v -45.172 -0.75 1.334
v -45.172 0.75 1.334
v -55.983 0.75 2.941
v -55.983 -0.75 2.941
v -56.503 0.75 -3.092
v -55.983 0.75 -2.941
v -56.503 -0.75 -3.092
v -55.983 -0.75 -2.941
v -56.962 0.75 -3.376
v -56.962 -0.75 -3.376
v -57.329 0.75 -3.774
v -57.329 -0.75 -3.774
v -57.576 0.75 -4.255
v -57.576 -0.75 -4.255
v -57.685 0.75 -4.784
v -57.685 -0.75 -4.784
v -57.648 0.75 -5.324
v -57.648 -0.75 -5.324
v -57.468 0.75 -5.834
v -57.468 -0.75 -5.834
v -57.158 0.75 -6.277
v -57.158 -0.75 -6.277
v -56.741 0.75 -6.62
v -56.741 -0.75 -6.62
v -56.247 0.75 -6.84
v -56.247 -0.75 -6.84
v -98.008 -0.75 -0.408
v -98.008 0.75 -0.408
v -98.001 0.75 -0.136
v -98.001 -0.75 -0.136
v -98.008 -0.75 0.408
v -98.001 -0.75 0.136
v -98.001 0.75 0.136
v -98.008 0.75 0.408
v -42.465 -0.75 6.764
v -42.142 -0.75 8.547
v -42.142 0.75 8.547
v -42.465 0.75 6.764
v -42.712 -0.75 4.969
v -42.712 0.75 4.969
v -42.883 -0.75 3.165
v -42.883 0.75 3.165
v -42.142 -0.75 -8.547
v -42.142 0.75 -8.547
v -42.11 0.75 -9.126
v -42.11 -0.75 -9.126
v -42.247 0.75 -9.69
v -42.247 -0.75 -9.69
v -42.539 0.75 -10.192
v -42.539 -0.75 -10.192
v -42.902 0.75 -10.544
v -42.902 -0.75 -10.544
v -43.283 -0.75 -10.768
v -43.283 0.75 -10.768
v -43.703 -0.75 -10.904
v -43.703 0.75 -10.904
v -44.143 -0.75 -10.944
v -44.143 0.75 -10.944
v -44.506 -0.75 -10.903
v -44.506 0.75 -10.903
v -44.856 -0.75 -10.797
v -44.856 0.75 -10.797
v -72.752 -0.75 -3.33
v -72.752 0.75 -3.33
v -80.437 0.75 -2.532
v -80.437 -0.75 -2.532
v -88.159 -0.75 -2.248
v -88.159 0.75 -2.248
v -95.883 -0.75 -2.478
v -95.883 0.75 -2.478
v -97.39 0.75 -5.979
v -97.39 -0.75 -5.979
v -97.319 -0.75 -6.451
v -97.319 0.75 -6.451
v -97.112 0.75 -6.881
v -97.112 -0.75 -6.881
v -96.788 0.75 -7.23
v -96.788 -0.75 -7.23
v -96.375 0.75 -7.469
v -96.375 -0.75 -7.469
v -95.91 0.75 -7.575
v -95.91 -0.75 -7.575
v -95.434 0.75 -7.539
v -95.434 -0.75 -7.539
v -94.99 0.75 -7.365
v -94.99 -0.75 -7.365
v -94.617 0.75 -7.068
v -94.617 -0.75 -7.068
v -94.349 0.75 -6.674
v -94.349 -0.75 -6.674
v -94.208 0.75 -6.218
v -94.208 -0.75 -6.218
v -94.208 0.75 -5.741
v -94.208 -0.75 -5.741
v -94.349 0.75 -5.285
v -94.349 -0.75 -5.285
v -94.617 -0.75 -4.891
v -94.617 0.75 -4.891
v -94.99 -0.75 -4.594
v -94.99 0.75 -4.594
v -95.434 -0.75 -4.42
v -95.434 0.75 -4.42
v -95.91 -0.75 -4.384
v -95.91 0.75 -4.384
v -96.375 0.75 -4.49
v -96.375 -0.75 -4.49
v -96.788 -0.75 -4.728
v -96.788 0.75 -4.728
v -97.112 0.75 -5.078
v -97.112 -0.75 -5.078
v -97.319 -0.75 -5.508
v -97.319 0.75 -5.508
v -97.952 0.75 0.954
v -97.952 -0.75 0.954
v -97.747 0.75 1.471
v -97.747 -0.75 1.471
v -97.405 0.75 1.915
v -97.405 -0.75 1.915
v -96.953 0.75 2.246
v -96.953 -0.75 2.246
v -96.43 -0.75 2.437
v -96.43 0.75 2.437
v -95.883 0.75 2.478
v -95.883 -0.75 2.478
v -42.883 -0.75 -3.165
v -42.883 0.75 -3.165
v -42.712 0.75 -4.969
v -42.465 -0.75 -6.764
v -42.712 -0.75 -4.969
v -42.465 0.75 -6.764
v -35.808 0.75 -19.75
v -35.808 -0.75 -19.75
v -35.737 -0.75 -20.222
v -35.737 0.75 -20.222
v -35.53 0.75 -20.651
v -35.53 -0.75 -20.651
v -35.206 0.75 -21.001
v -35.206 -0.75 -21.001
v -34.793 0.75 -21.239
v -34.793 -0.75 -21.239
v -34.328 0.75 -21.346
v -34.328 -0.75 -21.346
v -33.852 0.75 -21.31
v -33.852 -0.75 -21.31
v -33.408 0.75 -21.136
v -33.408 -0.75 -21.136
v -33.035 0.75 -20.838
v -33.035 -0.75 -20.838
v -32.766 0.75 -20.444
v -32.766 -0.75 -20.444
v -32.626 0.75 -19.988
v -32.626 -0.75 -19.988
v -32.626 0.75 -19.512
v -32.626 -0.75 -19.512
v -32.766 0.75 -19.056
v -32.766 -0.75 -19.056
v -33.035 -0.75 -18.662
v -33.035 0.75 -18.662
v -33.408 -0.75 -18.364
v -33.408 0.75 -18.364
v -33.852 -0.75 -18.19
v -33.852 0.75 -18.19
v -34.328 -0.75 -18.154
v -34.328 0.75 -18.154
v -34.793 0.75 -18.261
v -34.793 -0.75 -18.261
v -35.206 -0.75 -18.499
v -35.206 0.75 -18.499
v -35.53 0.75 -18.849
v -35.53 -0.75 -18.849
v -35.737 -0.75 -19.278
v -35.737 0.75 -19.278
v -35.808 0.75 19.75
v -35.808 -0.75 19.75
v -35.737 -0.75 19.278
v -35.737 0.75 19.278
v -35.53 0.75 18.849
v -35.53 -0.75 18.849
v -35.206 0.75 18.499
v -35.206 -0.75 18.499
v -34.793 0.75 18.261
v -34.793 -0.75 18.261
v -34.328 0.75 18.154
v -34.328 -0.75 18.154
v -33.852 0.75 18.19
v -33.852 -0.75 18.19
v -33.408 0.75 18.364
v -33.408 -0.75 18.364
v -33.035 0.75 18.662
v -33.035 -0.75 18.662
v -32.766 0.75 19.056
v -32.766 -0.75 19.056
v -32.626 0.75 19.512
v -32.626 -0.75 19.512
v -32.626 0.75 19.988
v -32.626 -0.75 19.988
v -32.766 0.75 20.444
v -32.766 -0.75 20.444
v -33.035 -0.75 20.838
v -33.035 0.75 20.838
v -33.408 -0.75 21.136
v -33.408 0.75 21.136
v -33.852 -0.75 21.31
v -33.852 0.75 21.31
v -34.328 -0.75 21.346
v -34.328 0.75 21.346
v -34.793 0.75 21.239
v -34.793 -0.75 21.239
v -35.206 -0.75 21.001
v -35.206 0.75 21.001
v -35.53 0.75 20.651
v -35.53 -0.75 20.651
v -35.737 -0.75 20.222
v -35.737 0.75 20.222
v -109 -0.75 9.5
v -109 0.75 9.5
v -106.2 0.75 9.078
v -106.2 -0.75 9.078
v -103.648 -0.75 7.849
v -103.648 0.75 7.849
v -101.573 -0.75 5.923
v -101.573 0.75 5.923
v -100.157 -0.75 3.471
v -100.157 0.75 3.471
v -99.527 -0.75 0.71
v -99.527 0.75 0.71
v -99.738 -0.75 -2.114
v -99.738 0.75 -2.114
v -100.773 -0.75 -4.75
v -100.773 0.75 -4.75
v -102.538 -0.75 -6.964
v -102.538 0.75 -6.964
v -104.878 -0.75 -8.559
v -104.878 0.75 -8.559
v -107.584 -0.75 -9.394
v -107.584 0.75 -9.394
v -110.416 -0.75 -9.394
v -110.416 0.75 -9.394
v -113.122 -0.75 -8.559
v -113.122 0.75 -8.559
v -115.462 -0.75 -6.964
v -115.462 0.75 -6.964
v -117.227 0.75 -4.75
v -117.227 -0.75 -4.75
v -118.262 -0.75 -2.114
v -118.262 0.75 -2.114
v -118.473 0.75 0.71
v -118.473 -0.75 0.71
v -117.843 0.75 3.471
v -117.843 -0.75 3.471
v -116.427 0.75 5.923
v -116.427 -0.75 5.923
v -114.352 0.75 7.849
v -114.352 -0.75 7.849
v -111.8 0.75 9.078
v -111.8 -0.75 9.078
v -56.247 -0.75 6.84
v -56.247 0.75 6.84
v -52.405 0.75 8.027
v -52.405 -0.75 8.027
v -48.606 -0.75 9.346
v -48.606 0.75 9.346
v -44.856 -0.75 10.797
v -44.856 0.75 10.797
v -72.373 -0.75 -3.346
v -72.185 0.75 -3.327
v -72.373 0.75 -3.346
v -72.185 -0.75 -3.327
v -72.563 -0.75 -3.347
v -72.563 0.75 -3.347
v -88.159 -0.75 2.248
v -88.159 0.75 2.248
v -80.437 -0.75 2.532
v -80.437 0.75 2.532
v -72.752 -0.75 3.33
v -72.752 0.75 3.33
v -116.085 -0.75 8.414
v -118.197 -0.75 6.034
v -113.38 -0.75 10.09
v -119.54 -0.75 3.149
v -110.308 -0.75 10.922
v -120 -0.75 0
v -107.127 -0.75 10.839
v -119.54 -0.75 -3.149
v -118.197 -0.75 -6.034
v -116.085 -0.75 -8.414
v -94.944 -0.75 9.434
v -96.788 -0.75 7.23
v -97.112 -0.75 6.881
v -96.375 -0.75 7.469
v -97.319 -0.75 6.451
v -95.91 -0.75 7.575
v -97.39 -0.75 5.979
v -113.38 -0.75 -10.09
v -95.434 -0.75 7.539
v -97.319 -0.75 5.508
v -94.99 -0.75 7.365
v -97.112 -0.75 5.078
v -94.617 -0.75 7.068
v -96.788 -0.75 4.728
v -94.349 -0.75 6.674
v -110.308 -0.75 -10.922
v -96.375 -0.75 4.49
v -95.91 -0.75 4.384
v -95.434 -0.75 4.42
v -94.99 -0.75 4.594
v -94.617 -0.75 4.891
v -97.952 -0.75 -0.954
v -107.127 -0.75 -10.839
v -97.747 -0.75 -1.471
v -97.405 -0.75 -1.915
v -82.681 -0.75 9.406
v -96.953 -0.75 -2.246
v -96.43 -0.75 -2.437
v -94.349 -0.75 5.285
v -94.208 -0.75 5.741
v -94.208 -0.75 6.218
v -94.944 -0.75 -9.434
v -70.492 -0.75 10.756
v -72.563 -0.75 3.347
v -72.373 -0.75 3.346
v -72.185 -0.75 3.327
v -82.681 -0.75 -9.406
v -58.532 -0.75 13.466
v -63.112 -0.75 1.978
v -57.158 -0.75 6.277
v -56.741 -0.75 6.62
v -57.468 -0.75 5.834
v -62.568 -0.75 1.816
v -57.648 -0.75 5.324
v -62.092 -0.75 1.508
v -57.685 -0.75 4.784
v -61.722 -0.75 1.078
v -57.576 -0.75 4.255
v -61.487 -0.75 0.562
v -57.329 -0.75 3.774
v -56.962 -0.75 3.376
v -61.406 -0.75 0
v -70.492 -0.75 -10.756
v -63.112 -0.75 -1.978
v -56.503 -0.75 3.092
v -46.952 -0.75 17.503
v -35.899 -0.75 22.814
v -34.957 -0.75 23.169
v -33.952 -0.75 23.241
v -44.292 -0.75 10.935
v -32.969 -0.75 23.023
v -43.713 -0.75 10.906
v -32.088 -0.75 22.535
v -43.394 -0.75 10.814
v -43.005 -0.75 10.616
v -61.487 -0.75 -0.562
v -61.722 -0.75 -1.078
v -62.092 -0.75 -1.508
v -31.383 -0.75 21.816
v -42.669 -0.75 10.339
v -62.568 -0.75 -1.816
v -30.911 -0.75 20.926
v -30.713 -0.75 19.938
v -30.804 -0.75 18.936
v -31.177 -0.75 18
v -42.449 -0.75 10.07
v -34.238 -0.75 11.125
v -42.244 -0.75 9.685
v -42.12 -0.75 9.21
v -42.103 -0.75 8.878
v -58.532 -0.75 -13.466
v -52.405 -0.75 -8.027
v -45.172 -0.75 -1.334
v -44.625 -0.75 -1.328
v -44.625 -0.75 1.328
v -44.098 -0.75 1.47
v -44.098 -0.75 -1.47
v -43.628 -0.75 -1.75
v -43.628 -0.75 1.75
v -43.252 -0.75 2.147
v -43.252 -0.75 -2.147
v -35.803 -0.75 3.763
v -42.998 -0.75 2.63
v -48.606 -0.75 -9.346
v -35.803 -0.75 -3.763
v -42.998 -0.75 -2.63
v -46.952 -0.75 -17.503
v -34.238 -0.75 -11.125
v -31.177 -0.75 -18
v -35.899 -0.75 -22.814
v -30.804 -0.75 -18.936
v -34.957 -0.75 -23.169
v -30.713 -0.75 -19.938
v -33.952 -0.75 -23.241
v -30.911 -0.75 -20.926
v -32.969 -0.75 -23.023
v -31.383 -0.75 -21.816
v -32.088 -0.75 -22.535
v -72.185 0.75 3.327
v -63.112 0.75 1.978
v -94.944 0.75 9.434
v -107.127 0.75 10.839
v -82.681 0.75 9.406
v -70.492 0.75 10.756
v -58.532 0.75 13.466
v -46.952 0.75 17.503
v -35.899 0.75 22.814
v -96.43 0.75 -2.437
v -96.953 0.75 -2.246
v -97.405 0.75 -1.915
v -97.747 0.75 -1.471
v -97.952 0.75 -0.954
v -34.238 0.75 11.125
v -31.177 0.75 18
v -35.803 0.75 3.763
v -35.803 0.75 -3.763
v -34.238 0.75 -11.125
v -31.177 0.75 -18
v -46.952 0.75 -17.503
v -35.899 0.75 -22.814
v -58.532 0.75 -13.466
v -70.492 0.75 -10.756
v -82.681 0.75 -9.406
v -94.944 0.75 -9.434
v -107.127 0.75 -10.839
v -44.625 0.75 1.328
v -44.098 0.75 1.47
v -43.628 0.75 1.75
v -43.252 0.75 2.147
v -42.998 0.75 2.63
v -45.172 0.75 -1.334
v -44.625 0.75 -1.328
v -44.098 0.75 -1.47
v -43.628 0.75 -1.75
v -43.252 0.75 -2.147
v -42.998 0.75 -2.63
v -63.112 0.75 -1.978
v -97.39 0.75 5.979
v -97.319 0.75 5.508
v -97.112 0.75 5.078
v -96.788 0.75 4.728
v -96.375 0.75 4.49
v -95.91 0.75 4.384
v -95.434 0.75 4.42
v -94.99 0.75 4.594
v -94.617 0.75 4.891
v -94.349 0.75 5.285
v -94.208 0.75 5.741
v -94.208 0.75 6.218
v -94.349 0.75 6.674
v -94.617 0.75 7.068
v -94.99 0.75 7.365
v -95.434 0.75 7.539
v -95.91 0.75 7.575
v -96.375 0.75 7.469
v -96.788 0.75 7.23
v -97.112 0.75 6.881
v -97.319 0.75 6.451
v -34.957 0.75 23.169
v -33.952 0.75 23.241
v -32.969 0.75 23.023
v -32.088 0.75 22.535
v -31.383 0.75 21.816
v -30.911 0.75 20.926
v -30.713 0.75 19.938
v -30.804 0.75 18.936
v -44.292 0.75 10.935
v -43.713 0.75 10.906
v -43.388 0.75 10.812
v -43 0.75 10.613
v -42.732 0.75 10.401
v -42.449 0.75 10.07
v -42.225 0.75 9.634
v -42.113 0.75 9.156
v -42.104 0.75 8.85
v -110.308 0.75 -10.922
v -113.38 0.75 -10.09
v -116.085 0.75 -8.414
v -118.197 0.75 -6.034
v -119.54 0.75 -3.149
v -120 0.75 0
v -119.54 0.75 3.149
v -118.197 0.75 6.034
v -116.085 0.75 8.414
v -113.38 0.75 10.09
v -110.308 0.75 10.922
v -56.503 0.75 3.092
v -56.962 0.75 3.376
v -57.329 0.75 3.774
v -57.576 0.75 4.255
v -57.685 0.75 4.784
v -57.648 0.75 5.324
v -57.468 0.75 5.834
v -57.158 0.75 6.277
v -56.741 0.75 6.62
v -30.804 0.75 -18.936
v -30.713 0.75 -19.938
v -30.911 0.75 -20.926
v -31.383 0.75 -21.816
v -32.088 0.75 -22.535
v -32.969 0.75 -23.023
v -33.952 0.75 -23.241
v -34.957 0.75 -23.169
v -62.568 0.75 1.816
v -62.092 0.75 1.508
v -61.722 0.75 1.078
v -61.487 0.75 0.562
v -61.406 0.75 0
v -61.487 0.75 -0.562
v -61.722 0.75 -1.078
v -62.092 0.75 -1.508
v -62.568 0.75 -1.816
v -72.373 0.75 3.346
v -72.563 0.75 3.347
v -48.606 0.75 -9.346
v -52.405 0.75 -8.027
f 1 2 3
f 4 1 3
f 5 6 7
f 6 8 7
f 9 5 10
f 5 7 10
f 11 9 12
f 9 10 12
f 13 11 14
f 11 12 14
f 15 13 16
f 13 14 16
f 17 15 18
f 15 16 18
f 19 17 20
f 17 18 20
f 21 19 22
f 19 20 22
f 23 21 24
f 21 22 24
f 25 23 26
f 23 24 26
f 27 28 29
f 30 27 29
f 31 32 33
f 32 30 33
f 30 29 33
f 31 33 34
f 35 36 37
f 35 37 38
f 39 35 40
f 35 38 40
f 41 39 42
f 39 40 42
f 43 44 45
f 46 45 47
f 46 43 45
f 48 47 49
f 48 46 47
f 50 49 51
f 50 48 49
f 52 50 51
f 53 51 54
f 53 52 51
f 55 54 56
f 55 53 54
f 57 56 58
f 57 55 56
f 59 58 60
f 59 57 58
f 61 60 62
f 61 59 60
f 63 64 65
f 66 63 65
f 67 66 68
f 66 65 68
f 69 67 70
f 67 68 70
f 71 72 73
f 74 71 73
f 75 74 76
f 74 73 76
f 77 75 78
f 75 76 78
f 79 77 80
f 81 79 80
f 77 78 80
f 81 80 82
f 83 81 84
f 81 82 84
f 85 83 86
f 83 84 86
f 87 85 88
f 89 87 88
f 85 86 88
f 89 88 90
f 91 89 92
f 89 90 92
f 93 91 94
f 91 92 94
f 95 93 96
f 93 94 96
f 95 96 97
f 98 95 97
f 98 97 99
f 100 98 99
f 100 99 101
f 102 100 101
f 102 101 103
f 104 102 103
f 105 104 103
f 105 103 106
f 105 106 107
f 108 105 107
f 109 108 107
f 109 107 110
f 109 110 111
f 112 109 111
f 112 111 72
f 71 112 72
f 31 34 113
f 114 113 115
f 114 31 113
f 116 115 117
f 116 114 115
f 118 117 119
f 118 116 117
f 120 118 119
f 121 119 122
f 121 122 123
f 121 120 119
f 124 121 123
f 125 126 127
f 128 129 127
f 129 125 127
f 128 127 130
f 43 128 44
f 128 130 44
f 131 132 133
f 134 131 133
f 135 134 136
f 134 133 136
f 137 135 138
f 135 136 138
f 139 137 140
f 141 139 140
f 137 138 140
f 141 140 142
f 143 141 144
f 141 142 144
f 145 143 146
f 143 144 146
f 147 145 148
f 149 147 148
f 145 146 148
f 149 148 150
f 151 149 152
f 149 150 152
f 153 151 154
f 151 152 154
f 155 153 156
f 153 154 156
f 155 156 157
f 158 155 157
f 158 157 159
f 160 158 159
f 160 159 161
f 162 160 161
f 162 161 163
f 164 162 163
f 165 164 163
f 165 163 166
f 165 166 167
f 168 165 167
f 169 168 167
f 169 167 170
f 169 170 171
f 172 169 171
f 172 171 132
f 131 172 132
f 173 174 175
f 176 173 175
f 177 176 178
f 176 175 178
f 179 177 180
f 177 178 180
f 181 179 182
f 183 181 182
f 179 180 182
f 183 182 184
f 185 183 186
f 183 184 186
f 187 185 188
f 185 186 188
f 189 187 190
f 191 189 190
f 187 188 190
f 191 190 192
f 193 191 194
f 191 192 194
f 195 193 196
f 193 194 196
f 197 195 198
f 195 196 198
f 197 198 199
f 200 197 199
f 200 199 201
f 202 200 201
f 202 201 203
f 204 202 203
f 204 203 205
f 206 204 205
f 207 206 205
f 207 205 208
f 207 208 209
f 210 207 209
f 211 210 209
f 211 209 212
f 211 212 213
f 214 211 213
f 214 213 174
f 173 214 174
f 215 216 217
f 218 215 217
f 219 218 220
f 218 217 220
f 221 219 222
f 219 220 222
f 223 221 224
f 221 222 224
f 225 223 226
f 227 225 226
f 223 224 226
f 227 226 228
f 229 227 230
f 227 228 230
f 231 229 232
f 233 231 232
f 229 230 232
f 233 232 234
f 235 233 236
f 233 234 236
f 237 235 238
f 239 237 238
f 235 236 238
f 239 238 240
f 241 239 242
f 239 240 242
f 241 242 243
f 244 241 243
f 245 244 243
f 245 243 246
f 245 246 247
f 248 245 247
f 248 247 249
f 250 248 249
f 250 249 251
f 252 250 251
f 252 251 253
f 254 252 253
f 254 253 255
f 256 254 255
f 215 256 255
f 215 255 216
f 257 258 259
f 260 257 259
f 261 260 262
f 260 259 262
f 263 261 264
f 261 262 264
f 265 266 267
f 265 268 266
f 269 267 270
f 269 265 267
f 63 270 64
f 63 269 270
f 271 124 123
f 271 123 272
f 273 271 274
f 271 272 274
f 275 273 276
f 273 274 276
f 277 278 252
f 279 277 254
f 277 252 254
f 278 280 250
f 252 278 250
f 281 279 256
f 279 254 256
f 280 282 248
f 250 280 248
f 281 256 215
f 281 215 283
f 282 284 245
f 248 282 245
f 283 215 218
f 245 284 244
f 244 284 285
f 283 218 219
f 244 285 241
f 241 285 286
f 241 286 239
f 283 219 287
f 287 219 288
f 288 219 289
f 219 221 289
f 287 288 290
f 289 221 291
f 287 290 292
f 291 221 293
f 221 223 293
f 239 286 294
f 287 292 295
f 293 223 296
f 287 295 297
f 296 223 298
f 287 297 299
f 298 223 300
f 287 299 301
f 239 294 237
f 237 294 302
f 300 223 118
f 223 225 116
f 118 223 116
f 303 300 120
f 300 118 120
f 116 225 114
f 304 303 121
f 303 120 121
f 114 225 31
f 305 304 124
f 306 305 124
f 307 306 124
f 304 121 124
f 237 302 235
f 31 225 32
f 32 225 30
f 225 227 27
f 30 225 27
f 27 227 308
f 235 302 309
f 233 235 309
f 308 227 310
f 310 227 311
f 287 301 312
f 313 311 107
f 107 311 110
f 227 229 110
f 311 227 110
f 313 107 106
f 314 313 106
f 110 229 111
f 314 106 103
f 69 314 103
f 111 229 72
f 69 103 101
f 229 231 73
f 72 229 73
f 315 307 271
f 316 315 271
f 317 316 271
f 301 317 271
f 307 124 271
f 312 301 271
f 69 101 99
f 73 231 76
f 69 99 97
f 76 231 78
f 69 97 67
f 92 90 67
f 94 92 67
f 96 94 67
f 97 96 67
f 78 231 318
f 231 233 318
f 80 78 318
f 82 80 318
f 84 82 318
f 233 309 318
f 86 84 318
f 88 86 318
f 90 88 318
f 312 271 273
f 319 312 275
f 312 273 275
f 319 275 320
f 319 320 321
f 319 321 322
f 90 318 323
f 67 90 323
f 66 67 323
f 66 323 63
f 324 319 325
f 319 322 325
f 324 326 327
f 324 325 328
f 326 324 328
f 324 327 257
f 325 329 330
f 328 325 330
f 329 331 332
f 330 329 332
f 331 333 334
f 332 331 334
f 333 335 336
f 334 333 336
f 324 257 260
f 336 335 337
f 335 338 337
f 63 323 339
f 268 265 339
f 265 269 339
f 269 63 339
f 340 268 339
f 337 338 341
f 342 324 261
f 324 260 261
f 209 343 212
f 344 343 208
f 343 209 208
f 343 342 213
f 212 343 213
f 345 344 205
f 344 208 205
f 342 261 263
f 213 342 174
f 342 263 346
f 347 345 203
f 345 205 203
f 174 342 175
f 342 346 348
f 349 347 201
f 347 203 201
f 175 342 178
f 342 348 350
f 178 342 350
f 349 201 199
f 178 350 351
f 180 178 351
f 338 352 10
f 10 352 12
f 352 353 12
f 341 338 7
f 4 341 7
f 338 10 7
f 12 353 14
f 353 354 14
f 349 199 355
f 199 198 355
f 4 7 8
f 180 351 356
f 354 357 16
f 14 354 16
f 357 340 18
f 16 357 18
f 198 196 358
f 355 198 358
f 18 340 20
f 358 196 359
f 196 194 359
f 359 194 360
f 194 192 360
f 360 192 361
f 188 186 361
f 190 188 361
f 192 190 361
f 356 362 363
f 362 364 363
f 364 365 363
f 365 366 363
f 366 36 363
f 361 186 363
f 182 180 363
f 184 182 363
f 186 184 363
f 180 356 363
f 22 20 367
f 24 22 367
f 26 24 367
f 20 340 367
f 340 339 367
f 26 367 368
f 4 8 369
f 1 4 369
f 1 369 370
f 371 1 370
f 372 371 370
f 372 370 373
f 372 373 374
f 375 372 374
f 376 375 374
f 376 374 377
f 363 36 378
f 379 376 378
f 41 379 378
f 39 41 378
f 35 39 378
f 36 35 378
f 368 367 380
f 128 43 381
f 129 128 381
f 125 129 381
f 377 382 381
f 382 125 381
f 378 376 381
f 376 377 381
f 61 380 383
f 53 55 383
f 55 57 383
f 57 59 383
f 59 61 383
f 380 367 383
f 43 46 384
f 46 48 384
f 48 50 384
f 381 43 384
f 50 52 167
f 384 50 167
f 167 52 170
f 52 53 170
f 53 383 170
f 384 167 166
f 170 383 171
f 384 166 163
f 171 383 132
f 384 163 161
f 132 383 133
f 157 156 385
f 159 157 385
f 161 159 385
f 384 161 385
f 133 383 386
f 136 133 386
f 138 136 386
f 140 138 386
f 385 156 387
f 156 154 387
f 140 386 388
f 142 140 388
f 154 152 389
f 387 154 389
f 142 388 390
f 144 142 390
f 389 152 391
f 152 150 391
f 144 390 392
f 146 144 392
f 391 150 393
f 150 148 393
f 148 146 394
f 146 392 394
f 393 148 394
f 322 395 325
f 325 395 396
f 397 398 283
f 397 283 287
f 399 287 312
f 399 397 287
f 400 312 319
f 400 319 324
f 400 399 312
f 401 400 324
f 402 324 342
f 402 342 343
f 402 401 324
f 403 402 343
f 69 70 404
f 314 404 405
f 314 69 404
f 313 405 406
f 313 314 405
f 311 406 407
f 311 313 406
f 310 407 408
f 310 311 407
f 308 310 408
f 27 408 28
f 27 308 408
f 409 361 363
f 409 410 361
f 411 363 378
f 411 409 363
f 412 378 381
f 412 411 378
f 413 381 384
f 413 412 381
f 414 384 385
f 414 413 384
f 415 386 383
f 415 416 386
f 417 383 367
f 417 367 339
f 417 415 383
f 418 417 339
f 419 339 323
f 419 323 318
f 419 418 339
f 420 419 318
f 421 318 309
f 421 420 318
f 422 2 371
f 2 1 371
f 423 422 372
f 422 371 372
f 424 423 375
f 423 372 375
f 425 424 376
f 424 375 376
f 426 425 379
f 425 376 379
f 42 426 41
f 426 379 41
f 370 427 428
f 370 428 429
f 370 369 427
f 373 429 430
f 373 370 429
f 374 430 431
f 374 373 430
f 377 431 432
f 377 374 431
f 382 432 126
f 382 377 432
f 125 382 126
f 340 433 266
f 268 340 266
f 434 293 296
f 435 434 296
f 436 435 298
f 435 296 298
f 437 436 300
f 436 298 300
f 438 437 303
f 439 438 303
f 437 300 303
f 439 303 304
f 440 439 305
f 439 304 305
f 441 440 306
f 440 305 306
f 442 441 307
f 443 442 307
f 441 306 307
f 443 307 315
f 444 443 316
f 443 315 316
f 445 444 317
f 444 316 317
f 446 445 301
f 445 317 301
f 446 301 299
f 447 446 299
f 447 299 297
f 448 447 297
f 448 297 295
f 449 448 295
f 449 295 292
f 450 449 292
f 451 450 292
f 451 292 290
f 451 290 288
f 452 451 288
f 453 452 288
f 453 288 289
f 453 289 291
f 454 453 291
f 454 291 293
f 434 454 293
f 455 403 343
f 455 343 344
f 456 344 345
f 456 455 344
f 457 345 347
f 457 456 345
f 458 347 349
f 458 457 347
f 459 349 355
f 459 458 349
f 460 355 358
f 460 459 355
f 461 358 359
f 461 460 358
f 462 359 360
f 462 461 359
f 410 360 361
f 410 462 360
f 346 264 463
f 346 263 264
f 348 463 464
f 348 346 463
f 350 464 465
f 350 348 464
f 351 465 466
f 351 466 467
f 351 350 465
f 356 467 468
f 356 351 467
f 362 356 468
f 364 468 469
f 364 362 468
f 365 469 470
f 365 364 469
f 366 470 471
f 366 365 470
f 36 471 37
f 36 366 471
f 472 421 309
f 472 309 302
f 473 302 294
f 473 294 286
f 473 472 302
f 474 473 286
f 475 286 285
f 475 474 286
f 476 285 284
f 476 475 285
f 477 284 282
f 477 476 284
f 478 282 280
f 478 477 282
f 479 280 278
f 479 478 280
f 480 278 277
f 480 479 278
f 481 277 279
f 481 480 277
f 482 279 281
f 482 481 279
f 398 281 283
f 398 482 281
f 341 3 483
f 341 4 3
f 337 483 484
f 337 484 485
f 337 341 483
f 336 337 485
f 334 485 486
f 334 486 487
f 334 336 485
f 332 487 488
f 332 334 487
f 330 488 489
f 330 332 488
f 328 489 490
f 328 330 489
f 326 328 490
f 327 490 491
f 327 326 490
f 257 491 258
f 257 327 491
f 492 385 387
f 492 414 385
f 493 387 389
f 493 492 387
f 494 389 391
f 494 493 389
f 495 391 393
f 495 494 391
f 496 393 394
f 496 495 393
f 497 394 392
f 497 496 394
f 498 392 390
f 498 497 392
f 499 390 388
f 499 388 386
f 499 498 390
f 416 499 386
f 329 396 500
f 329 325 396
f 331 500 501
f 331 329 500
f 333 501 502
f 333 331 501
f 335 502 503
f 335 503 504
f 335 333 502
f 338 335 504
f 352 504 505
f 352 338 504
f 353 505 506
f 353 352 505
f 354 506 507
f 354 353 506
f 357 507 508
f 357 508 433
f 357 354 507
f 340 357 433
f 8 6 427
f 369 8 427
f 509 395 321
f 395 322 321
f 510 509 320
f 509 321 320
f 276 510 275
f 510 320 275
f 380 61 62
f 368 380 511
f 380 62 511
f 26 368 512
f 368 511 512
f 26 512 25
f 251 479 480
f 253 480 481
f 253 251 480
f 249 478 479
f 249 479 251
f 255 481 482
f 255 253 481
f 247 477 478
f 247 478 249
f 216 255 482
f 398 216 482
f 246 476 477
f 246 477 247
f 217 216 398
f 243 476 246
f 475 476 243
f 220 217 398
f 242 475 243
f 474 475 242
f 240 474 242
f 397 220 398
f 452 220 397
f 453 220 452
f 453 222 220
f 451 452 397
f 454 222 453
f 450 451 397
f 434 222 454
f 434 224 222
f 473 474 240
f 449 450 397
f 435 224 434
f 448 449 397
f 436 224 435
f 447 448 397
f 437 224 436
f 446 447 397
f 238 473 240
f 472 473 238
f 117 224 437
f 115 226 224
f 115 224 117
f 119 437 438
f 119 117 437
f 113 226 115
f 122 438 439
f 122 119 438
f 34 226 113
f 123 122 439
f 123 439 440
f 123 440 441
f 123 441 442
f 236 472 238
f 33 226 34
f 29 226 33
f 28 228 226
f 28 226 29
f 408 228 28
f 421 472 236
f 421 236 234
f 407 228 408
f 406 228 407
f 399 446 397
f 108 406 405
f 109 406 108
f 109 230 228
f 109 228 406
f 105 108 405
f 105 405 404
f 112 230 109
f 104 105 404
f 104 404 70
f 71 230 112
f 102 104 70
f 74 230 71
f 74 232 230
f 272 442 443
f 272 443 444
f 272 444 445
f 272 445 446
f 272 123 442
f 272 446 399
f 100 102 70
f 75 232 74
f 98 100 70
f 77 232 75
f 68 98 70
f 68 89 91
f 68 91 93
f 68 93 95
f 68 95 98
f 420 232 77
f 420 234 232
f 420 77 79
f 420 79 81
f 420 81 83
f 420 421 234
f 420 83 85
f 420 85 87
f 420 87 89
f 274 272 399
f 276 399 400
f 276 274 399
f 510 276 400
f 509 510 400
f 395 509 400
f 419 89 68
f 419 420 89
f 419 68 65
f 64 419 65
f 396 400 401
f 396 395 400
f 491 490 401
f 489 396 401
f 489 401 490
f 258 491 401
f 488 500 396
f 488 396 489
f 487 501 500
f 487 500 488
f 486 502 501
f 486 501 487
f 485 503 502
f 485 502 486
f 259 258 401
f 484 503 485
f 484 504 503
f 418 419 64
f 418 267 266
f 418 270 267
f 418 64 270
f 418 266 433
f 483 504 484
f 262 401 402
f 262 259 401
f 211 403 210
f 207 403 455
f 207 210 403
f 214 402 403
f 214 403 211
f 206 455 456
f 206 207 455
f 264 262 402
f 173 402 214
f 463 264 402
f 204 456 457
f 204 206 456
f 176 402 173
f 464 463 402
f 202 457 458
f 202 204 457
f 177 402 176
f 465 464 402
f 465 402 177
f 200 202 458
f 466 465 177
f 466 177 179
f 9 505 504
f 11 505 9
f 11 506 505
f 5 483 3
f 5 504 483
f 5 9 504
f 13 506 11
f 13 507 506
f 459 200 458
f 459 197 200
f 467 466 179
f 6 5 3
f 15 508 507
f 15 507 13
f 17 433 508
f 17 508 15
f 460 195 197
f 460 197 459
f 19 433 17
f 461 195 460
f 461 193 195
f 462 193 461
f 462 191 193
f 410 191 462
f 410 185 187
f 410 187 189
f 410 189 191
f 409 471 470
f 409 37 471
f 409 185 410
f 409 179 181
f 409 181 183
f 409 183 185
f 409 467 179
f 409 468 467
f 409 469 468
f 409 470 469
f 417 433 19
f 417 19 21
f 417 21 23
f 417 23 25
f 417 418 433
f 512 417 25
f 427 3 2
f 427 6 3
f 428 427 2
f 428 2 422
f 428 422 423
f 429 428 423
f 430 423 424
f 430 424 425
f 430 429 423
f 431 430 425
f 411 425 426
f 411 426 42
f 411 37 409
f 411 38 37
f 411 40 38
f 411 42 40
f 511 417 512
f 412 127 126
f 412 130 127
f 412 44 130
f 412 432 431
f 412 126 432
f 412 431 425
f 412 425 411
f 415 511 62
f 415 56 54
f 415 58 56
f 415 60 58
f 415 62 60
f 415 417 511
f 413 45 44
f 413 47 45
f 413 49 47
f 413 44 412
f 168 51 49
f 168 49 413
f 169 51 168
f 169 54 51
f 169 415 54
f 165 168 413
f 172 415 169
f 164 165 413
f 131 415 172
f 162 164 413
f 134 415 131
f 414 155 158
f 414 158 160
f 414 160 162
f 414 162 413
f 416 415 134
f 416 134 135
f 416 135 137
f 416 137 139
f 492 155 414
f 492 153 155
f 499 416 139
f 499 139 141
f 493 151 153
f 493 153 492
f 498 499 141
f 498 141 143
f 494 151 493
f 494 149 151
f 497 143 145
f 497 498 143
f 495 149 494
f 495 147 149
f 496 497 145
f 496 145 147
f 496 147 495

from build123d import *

# Parameters (mm, degrees)
SKETCH1_R                      = 3.5
BOSS_EXTRUDE1_DEPTH            = 0.75
F_3_2_3_2_DIAMETER_HOLE1_D     = 3.2
F_3_2_3_2_DIAMETER_HOLE1_DEPTH = 10
F_3_2_3_2_DIAMETER_HOLE1_TIP   = 0.96137699
CUT_EXTRUDE1_DEPTH             = 123.2407972
FILLET1_R                      = 2
SKETCH7_R                      = 9.5
CUT_EXTRUDE2_DEPTH             = 123.240797318


with BuildPart() as part:
    # Sketch1 → Boss-Extrude1 (new, symmetric)
    with BuildSketch(Plane(origin=(0, 0, 0), x_dir=(1, 0, 0), z_dir=(0, 1, 0))):
        with BuildLine():
            ThreePointArc((-37.239092363, -21.5), (-43, 0), (-37.239092363, 21.5))
            ThreePointArc((-37.239092363, 21.5), (-36.658838331, 22.248681329), (-35.899079455, 22.81435343))
            ThreePointArc((-35.899079455, 22.81435343), (-70.492179883, 10.7556392), (-107.126701642, 10.839315166))
            ThreePointArc((-107.126701642, 10.839315166), (-120, 0), (-107.126701642, -10.839315166))
            ThreePointArc((-107.126701642, -10.839315166), (-70.492179883, -10.7556392), (-35.899079455, -22.81435343))
            ThreePointArc((-35.899079455, -22.81435343), (-36.658838331, -22.248681329), (-37.239092363, -21.5))
        make_face()
        with BuildLine():
            ThreePointArc((-31.176914536, 18), (-35.958003449, 16.718911087), (-37.239092363, 21.5))
            ThreePointArc((-37.239092363, 21.5), (-43, 0), (-37.239092363, -21.5))
            ThreePointArc((-37.239092363, -21.5), (-35.958003449, -16.718911087), (-31.176914536, -18))
            ThreePointArc((-31.176914536, -18), (-36, 0), (-31.176914536, 18))
        make_face()
        with Locations((-34.208003449, -19.75)):
            Circle(SKETCH1_R)
        with Locations((-34.208003449, 19.75)):
            Circle(SKETCH1_R)
    extrude(amount=BOSS_EXTRUDE1_DEPTH, both=True)

    # Ø3.2 (3.2) Diameter Hole1
    with Locations(Plane(origin=(0, 0.75, 0), x_dir=(1, 0, 0), z_dir=(0, 1, 0))):
        with Locations((-34.208003449, 19.75), (-34.208003449, -19.75), (-95.790276336, 5.979398024), (-95.790276336, -5.979398024)):
            Hole(F_3_2_3_2_DIAMETER_HOLE1_D / 2, depth=F_3_2_3_2_DIAMETER_HOLE1_DEPTH)
            with Locations((0, 0, -(F_3_2_3_2_DIAMETER_HOLE1_DEPTH + F_3_2_3_2_DIAMETER_HOLE1_TIP / 2))):  # 118° drill point
                Cone(0, F_3_2_3_2_DIAMETER_HOLE1_D / 2, F_3_2_3_2_DIAMETER_HOLE1_TIP, mode=Mode.SUBTRACT)

    # Sketch6 → Cut-Extrude1 (cut, through all)
    with BuildSketch(Plane(origin=(0, 0.75, 0), x_dir=(1, 0, 0), z_dir=(0, 1, 0))):
        with BuildLine():
            Line((-72.469338063, -3.369046694), (-49.802019621, 0))
            Line((-49.802019621, 0), (-72.469338063, 3.369046694))
            ThreePointArc((-72.469338063, 3.369046694), (-85.377857375, 2.290839769), (-98.326107181, 2.65857332))
            ThreePointArc((-98.326107181, 2.65857332), (-98, 0), (-98.326107181, -2.65857332))
            ThreePointArc((-98.326107181, -2.65857332), (-85.377857375, -2.290839769), (-72.469338063, -3.369046694))
        make_face()
        with BuildLine():
            Line((-66.096117167, 4.443764231), (-42.988154947, 1.009224591))
            ThreePointArc((-42.988154947, 1.009224591), (-42.467311238, 6.747405149), (-41.183985346, 12.36443897))
            ThreePointArc((-41.183985346, 12.36443897), (-53.416219701, 7.70010587), (-66.096117167, 4.443764231))
        make_face()
        with BuildLine():
            ThreePointArc((-41.183985346, -12.36443897), (-42.467311238, -6.747405149), (-42.988154947, -1.009224591))
            Line((-42.988154947, -1.009224591), (-66.096117167, -4.443764231))
            ThreePointArc((-66.096117167, -4.443764231), (-53.416219701, -7.70010587), (-41.183985346, -12.36443897))
        make_face()
    extrude(amount=-CUT_EXTRUDE1_DEPTH, mode=Mode.SUBTRACT)

    # Fillet1
    fillet1_edges = [part.edges().sort_by_distance(p)[0] for p in [
        (-98.326107181, 0, 2.65857332),
        (-98.326107181, 0, -2.65857332),
        (-72.469338063, 0, -3.369046694),
        (-49.802019621, 0, 0),
        (-72.469338063, 0, 3.369046694),
        (-41.183985346, 0, -12.36443897),
        (-42.988154947, 0, -1.009224591),
        (-66.096117167, 0, -4.443764231),
        (-42.988154947, 0, 1.009224591),
        (-41.183985346, 0, 12.36443897),
        (-66.096117167, 0, 4.443764231),
    ]]
    fillet(fillet1_edges, radius=FILLET1_R)

    # Sketch7 → Cut-Extrude2 (cut, through all)
    with BuildSketch(Plane(origin=(0, 0.75, 0), x_dir=(1, 0, 0), z_dir=(0, 1, 0))):
        with Locations(Location((-109, 0, 0), (0, 0, 270))):
            Circle(SKETCH7_R)
    extrude(amount=-CUT_EXTRUDE2_DEPTH, mode=Mode.SUBTRACT)


solid = part.part
